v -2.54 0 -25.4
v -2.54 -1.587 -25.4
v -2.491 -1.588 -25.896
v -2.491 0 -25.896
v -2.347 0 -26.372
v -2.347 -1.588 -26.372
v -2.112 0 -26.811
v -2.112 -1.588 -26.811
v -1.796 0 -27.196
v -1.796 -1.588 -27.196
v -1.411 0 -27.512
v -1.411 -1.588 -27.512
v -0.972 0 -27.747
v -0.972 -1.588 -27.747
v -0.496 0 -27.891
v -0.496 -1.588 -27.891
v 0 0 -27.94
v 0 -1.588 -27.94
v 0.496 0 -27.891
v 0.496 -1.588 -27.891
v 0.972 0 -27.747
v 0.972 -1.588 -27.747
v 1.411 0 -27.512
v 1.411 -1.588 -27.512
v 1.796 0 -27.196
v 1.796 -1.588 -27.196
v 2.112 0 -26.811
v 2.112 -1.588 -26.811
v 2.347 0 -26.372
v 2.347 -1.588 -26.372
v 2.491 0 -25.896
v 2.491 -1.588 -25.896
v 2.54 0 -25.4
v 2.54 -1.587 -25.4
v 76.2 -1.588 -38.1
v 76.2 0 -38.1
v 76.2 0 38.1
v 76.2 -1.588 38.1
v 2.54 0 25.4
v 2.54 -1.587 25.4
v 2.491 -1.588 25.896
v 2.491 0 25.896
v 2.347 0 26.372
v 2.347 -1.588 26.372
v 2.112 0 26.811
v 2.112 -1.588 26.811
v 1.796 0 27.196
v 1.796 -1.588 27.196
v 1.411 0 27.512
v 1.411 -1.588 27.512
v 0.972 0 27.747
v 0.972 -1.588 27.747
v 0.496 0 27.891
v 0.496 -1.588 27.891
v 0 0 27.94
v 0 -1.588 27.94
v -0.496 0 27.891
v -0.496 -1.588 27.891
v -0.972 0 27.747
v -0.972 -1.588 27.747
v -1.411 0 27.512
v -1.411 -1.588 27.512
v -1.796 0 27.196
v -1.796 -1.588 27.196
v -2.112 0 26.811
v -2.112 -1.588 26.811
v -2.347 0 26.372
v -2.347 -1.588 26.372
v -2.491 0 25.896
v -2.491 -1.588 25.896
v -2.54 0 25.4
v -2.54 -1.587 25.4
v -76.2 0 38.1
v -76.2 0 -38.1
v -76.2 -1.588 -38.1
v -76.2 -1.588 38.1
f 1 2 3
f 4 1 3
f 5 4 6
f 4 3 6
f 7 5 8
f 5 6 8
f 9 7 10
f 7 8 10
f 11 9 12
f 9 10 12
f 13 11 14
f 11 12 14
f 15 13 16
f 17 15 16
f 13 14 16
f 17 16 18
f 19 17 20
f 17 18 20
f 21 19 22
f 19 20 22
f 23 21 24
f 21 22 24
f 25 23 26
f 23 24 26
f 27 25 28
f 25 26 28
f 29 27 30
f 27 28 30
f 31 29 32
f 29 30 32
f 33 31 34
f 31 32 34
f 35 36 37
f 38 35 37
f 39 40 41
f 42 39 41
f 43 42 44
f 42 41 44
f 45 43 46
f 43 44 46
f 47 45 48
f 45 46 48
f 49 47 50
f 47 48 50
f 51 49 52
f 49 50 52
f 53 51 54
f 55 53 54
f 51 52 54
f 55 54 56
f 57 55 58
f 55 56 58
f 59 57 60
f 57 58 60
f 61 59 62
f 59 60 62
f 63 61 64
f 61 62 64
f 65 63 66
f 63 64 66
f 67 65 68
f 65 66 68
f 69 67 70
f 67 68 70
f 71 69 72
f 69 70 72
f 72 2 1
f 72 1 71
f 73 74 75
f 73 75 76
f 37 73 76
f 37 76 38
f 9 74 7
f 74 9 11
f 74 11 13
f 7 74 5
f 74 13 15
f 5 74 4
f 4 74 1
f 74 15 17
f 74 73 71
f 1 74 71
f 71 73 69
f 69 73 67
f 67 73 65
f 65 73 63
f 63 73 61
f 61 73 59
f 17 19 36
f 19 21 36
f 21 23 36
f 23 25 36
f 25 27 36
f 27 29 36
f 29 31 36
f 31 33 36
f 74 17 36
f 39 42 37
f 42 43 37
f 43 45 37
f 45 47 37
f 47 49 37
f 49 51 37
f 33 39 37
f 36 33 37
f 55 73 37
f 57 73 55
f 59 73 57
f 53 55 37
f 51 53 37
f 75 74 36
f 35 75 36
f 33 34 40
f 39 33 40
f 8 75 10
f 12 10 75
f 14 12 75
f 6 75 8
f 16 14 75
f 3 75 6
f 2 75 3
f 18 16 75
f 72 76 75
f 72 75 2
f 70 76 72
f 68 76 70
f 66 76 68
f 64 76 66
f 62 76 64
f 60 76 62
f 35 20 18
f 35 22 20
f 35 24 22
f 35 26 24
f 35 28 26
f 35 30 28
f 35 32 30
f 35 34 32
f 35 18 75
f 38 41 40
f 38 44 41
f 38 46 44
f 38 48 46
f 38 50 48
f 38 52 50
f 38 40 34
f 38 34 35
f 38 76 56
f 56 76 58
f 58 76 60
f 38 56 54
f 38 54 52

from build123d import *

# Parameters (mm, degrees)
F0_W     = 152.4
F0_H     = 76.2
F1_DEPTH = 1.5875
F2_W     = 5.08
F2_H     = 50.8
F3_DEPTH = 25.4
F5_DEPTH = 25.4


# Not quite as in the source:
# - a length typed as a fraction of an inch, garbled in the dataset ("3 / 203.2 mm" for 3/8 in), is restored


with BuildPart() as f1:
    # F0 (on Front) → F1 (new body)
    with BuildSketch(Plane.XZ):
        Rectangle(F0_W, F0_H)
    extrude(amount=F1_DEPTH)

    # F2 (on face) → F3 (cut)
    with BuildSketch(Plane.XZ.offset(1.5875)):
        Rectangle(F2_W, F2_H)
    extrude(amount=-F3_DEPTH, mode=Mode.SUBTRACT)

    # F4 (on face) → F5 (cut)
    with BuildSketch(Plane.XZ.offset(1.5875)):
        with BuildLine():
            Line((2.54, -25.4), (-2.54, -25.4))
            ThreePointArc((-2.54, -25.4), (0, -27.94), (2.54, -25.4))
        make_face()
        with BuildLine():
            ThreePointArc((2.54, 25.4), (0, 27.94), (-2.54, 25.4))
            Line((-2.54, 25.4), (2.54, 25.4))
        make_face()
    extrude(amount=-F5_DEPTH, mode=Mode.SUBTRACT)


solid = f1.part
